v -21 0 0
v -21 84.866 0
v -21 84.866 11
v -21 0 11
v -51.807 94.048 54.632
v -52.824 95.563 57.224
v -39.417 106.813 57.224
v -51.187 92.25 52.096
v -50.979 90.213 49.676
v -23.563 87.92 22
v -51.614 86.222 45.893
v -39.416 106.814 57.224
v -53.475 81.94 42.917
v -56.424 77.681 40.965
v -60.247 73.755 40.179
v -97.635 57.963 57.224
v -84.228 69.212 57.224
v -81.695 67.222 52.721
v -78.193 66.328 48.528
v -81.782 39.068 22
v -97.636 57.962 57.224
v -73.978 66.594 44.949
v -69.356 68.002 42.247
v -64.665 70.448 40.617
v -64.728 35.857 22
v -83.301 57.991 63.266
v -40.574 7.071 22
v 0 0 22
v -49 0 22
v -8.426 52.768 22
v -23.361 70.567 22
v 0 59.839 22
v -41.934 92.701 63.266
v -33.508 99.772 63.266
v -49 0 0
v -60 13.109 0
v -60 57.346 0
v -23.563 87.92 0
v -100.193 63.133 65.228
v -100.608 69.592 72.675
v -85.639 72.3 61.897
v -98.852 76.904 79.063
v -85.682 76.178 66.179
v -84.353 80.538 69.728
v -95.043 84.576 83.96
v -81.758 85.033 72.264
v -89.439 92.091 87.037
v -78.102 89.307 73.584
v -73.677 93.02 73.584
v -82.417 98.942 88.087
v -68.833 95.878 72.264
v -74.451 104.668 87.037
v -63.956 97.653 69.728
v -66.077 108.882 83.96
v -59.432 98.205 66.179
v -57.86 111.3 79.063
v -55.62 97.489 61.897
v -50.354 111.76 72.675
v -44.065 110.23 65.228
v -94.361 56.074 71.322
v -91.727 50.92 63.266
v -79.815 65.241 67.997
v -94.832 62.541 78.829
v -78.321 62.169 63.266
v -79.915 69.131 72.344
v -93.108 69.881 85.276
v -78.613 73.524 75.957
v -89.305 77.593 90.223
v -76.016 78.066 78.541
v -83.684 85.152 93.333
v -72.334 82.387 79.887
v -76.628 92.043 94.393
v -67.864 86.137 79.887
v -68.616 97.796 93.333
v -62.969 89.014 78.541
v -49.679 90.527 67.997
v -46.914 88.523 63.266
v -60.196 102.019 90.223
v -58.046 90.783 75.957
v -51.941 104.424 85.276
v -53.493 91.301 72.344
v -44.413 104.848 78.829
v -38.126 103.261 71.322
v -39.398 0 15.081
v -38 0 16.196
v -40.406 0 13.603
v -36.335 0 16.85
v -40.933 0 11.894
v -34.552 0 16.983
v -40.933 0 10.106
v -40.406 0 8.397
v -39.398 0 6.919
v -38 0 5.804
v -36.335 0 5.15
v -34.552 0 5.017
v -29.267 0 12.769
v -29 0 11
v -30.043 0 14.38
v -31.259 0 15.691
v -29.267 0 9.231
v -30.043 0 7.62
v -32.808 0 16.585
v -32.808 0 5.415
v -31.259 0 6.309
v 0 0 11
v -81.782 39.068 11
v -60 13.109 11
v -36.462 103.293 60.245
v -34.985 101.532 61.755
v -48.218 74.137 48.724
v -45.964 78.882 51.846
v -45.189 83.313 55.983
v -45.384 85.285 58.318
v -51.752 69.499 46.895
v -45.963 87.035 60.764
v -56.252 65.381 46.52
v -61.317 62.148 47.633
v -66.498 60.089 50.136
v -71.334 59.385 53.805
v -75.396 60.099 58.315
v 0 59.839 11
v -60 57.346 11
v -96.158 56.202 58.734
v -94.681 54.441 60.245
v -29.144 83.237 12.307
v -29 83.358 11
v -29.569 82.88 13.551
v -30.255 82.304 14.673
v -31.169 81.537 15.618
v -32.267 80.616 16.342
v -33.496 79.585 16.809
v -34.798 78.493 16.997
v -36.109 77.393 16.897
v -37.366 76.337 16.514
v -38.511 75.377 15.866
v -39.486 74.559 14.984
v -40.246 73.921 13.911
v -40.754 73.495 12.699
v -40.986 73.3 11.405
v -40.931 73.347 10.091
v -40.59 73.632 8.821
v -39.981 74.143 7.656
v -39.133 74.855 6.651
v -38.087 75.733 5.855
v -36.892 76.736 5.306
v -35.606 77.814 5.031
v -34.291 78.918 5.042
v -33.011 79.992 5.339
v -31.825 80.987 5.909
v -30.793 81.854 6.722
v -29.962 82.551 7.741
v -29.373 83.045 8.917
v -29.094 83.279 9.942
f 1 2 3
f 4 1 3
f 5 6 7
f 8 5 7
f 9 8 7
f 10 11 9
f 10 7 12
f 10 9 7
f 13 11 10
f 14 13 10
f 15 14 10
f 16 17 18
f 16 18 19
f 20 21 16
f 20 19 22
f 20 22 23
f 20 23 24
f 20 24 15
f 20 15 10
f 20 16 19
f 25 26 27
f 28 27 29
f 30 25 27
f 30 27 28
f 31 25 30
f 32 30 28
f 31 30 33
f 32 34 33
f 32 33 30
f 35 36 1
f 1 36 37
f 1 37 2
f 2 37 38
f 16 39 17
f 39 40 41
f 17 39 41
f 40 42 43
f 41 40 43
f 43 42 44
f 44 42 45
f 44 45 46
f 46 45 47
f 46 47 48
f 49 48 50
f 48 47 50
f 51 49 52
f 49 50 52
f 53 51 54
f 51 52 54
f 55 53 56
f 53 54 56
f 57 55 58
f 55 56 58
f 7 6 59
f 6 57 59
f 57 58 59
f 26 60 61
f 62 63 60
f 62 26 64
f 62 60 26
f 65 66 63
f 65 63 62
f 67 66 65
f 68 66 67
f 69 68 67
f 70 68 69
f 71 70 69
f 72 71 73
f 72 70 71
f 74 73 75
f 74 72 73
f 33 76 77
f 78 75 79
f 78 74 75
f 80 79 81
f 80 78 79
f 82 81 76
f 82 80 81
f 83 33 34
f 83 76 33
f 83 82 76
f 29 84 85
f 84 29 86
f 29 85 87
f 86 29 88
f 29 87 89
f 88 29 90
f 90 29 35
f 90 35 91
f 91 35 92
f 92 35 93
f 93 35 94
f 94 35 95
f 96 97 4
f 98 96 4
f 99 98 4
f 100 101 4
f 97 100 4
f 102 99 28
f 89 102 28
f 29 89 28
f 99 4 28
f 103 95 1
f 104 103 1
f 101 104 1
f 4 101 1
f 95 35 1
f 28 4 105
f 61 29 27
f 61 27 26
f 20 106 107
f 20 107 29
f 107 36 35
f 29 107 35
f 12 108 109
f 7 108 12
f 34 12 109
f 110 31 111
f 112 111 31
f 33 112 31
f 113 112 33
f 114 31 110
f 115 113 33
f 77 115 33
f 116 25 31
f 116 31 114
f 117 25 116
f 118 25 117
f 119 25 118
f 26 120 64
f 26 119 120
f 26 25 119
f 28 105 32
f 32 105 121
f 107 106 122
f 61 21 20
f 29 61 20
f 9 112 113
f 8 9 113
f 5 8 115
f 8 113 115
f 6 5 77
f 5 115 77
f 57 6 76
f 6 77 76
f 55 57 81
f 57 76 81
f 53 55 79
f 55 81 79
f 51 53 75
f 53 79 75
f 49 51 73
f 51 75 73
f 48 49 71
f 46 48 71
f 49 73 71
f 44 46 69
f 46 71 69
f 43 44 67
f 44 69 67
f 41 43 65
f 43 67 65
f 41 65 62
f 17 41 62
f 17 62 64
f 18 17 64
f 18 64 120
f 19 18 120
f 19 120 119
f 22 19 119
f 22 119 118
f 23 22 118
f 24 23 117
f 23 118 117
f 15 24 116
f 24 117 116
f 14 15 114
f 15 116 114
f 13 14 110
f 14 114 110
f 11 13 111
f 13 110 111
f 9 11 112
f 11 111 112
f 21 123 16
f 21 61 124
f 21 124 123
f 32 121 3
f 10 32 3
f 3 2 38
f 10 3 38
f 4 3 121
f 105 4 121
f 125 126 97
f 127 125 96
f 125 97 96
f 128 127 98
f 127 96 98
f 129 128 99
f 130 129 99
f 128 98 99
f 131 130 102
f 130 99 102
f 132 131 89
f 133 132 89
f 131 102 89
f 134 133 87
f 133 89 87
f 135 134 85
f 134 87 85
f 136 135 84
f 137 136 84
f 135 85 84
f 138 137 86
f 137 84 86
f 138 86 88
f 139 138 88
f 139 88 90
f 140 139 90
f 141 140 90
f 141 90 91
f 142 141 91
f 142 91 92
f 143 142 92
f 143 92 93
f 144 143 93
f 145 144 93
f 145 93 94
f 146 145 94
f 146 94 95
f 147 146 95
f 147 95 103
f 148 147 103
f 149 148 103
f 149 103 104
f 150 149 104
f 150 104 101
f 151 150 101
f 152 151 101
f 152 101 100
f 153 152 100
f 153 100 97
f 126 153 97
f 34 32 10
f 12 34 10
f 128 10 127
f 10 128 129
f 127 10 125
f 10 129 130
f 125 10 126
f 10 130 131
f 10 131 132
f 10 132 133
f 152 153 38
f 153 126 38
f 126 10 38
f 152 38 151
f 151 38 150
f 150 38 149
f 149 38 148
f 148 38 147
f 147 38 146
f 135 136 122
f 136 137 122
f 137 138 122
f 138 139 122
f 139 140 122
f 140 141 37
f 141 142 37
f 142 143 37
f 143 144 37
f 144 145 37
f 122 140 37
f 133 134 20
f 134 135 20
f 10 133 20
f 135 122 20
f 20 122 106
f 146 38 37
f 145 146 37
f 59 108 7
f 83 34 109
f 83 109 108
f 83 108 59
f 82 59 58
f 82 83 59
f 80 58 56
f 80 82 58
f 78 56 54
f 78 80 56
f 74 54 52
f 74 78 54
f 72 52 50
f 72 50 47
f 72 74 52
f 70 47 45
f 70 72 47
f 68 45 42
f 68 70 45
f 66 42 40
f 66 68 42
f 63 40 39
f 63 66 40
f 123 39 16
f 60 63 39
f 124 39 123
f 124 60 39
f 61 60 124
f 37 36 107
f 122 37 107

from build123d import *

# Parameters (mm, degrees)
F1_DEPTH  = 22
F2_W      = 21
F2_H      = 11
F2_W_2    = 40.0109538998
F2_H_2    = 12.4791396397
F3_DEPTH  = 87.9211249352
F4_R      = 6
F5_DEPTH  = 87.9211249352
F7_DEPTH  = 76
F9_DEPTH  = 10.9952556712
F10_R     = 20.5
F11_DEPTH = 79.2430002024
F13_DEPTH = 11
F15_DEPTH = 11


with BuildPart() as f1:
    # F0 (on Top) → F1 (new body)
    with BuildSketch(Plane.XY):
        Polygon((-49, 0), (0, 0), (0, 59.8390848043), (-23.562790417, 87.9201249352), (-81.782168094, 39.0682665991), align=None)
    extrude(amount=F1_DEPTH)

    # F2 (on face) → F3 (cut, through all)
    with BuildSketch(Plane.XZ):
        with Locations((-10.5, 5.5)):
            Rectangle(F2_W, F2_H)
        with Locations((-80.0054769499, 4.7604301802)):
            Rectangle(F2_W_2, F2_H_2)
    extrude(amount=-F3_DEPTH, mode=Mode.SUBTRACT)

    # F4 (on face) → F5 (cut, through all)
    with BuildSketch(Plane.XZ):
        with Locations((-35, 11)):
            Circle(F4_R)
    extrude(amount=-F5_DEPTH, mode=Mode.SUBTRACT)

    # F6 (on face) → F7 (join, through all)
    with BuildSketch(Plane(origin=(-28.7543803528, -24.1277899488, 0), x_dir=(0.6427876097, -0.7660444431, 0), z_dir=(-0.7660444431, -0.6427876097, 0))):
        Polygon((-107.1603796377, 57.2235379044), (-82.4965928746, 22), (-69.0738641545, 22), (-97.9683072221, 63.265541273), align=None)
    extrude(amount=-F7_DEPTH)

    # F8 (on face) → F9 (join, through all)
    with BuildSketch(Plane(origin=(-23.1484785961, 27.58728253, -25.2163217941), x_dir=(0.8501498705, 0.3886467221, -0.3552448777), z_dir=(0.5265407845, -0.6275068716, 0.5735764364))):
        with BuildLine():
            Line((-80.6666191033, 81.0518724564), (-12.1853081013, 114.0110903395))
            ThreePointArc((-12.1853081015, 114.0110903394), (-62.905572543, 131.7721368985), (-80.6666191021, 81.0518724571))
        make_face()
    extrude(amount=-F9_DEPTH)

    # F10 (on face) → F11 (cut, through all)
    with BuildSketch(Plane(origin=(-23.1484785962, 27.5872825301, -25.2163217941), x_dir=(0.8501498705, 0.3886467221, -0.3552448777), z_dir=(0.5265407845, -0.6275068716, 0.5735764364))):
        with Locations((-46.4259636018, 97.5314813982)):
            Circle(F10_R)
    extrude(amount=-F11_DEPTH, mode=Mode.SUBTRACT)

    # F12 (on face) → F13 (join)
    with BuildSketch(Plane(origin=(-28.7543803528, -24.1277899488, 0), x_dir=(0.6427876097, -0.7660444431, 0), z_dir=(-0.7660444431, -0.6427876097, 0))):
        Polygon((-31.4965928746, 22), (-97.9683072221, 63.265541273), (-69.0738641544, 22), align=None)
    extrude(amount=-F13_DEPTH)

    # F14 (on face) → F15 (join)
    with BuildSketch(Plane(origin=(29.4649973242, 24.7240683874, 0), x_dir=(-0.6427876097, 0.7660444431, 0), z_dir=(0.7660444431, 0.6427876097, 0))):
        Polygon((69.0738641544, 22), (97.968307222, 63.265541273), (45.8393983956, 22), align=None)
    extrude(amount=-F15_DEPTH)


solid = f1.part
